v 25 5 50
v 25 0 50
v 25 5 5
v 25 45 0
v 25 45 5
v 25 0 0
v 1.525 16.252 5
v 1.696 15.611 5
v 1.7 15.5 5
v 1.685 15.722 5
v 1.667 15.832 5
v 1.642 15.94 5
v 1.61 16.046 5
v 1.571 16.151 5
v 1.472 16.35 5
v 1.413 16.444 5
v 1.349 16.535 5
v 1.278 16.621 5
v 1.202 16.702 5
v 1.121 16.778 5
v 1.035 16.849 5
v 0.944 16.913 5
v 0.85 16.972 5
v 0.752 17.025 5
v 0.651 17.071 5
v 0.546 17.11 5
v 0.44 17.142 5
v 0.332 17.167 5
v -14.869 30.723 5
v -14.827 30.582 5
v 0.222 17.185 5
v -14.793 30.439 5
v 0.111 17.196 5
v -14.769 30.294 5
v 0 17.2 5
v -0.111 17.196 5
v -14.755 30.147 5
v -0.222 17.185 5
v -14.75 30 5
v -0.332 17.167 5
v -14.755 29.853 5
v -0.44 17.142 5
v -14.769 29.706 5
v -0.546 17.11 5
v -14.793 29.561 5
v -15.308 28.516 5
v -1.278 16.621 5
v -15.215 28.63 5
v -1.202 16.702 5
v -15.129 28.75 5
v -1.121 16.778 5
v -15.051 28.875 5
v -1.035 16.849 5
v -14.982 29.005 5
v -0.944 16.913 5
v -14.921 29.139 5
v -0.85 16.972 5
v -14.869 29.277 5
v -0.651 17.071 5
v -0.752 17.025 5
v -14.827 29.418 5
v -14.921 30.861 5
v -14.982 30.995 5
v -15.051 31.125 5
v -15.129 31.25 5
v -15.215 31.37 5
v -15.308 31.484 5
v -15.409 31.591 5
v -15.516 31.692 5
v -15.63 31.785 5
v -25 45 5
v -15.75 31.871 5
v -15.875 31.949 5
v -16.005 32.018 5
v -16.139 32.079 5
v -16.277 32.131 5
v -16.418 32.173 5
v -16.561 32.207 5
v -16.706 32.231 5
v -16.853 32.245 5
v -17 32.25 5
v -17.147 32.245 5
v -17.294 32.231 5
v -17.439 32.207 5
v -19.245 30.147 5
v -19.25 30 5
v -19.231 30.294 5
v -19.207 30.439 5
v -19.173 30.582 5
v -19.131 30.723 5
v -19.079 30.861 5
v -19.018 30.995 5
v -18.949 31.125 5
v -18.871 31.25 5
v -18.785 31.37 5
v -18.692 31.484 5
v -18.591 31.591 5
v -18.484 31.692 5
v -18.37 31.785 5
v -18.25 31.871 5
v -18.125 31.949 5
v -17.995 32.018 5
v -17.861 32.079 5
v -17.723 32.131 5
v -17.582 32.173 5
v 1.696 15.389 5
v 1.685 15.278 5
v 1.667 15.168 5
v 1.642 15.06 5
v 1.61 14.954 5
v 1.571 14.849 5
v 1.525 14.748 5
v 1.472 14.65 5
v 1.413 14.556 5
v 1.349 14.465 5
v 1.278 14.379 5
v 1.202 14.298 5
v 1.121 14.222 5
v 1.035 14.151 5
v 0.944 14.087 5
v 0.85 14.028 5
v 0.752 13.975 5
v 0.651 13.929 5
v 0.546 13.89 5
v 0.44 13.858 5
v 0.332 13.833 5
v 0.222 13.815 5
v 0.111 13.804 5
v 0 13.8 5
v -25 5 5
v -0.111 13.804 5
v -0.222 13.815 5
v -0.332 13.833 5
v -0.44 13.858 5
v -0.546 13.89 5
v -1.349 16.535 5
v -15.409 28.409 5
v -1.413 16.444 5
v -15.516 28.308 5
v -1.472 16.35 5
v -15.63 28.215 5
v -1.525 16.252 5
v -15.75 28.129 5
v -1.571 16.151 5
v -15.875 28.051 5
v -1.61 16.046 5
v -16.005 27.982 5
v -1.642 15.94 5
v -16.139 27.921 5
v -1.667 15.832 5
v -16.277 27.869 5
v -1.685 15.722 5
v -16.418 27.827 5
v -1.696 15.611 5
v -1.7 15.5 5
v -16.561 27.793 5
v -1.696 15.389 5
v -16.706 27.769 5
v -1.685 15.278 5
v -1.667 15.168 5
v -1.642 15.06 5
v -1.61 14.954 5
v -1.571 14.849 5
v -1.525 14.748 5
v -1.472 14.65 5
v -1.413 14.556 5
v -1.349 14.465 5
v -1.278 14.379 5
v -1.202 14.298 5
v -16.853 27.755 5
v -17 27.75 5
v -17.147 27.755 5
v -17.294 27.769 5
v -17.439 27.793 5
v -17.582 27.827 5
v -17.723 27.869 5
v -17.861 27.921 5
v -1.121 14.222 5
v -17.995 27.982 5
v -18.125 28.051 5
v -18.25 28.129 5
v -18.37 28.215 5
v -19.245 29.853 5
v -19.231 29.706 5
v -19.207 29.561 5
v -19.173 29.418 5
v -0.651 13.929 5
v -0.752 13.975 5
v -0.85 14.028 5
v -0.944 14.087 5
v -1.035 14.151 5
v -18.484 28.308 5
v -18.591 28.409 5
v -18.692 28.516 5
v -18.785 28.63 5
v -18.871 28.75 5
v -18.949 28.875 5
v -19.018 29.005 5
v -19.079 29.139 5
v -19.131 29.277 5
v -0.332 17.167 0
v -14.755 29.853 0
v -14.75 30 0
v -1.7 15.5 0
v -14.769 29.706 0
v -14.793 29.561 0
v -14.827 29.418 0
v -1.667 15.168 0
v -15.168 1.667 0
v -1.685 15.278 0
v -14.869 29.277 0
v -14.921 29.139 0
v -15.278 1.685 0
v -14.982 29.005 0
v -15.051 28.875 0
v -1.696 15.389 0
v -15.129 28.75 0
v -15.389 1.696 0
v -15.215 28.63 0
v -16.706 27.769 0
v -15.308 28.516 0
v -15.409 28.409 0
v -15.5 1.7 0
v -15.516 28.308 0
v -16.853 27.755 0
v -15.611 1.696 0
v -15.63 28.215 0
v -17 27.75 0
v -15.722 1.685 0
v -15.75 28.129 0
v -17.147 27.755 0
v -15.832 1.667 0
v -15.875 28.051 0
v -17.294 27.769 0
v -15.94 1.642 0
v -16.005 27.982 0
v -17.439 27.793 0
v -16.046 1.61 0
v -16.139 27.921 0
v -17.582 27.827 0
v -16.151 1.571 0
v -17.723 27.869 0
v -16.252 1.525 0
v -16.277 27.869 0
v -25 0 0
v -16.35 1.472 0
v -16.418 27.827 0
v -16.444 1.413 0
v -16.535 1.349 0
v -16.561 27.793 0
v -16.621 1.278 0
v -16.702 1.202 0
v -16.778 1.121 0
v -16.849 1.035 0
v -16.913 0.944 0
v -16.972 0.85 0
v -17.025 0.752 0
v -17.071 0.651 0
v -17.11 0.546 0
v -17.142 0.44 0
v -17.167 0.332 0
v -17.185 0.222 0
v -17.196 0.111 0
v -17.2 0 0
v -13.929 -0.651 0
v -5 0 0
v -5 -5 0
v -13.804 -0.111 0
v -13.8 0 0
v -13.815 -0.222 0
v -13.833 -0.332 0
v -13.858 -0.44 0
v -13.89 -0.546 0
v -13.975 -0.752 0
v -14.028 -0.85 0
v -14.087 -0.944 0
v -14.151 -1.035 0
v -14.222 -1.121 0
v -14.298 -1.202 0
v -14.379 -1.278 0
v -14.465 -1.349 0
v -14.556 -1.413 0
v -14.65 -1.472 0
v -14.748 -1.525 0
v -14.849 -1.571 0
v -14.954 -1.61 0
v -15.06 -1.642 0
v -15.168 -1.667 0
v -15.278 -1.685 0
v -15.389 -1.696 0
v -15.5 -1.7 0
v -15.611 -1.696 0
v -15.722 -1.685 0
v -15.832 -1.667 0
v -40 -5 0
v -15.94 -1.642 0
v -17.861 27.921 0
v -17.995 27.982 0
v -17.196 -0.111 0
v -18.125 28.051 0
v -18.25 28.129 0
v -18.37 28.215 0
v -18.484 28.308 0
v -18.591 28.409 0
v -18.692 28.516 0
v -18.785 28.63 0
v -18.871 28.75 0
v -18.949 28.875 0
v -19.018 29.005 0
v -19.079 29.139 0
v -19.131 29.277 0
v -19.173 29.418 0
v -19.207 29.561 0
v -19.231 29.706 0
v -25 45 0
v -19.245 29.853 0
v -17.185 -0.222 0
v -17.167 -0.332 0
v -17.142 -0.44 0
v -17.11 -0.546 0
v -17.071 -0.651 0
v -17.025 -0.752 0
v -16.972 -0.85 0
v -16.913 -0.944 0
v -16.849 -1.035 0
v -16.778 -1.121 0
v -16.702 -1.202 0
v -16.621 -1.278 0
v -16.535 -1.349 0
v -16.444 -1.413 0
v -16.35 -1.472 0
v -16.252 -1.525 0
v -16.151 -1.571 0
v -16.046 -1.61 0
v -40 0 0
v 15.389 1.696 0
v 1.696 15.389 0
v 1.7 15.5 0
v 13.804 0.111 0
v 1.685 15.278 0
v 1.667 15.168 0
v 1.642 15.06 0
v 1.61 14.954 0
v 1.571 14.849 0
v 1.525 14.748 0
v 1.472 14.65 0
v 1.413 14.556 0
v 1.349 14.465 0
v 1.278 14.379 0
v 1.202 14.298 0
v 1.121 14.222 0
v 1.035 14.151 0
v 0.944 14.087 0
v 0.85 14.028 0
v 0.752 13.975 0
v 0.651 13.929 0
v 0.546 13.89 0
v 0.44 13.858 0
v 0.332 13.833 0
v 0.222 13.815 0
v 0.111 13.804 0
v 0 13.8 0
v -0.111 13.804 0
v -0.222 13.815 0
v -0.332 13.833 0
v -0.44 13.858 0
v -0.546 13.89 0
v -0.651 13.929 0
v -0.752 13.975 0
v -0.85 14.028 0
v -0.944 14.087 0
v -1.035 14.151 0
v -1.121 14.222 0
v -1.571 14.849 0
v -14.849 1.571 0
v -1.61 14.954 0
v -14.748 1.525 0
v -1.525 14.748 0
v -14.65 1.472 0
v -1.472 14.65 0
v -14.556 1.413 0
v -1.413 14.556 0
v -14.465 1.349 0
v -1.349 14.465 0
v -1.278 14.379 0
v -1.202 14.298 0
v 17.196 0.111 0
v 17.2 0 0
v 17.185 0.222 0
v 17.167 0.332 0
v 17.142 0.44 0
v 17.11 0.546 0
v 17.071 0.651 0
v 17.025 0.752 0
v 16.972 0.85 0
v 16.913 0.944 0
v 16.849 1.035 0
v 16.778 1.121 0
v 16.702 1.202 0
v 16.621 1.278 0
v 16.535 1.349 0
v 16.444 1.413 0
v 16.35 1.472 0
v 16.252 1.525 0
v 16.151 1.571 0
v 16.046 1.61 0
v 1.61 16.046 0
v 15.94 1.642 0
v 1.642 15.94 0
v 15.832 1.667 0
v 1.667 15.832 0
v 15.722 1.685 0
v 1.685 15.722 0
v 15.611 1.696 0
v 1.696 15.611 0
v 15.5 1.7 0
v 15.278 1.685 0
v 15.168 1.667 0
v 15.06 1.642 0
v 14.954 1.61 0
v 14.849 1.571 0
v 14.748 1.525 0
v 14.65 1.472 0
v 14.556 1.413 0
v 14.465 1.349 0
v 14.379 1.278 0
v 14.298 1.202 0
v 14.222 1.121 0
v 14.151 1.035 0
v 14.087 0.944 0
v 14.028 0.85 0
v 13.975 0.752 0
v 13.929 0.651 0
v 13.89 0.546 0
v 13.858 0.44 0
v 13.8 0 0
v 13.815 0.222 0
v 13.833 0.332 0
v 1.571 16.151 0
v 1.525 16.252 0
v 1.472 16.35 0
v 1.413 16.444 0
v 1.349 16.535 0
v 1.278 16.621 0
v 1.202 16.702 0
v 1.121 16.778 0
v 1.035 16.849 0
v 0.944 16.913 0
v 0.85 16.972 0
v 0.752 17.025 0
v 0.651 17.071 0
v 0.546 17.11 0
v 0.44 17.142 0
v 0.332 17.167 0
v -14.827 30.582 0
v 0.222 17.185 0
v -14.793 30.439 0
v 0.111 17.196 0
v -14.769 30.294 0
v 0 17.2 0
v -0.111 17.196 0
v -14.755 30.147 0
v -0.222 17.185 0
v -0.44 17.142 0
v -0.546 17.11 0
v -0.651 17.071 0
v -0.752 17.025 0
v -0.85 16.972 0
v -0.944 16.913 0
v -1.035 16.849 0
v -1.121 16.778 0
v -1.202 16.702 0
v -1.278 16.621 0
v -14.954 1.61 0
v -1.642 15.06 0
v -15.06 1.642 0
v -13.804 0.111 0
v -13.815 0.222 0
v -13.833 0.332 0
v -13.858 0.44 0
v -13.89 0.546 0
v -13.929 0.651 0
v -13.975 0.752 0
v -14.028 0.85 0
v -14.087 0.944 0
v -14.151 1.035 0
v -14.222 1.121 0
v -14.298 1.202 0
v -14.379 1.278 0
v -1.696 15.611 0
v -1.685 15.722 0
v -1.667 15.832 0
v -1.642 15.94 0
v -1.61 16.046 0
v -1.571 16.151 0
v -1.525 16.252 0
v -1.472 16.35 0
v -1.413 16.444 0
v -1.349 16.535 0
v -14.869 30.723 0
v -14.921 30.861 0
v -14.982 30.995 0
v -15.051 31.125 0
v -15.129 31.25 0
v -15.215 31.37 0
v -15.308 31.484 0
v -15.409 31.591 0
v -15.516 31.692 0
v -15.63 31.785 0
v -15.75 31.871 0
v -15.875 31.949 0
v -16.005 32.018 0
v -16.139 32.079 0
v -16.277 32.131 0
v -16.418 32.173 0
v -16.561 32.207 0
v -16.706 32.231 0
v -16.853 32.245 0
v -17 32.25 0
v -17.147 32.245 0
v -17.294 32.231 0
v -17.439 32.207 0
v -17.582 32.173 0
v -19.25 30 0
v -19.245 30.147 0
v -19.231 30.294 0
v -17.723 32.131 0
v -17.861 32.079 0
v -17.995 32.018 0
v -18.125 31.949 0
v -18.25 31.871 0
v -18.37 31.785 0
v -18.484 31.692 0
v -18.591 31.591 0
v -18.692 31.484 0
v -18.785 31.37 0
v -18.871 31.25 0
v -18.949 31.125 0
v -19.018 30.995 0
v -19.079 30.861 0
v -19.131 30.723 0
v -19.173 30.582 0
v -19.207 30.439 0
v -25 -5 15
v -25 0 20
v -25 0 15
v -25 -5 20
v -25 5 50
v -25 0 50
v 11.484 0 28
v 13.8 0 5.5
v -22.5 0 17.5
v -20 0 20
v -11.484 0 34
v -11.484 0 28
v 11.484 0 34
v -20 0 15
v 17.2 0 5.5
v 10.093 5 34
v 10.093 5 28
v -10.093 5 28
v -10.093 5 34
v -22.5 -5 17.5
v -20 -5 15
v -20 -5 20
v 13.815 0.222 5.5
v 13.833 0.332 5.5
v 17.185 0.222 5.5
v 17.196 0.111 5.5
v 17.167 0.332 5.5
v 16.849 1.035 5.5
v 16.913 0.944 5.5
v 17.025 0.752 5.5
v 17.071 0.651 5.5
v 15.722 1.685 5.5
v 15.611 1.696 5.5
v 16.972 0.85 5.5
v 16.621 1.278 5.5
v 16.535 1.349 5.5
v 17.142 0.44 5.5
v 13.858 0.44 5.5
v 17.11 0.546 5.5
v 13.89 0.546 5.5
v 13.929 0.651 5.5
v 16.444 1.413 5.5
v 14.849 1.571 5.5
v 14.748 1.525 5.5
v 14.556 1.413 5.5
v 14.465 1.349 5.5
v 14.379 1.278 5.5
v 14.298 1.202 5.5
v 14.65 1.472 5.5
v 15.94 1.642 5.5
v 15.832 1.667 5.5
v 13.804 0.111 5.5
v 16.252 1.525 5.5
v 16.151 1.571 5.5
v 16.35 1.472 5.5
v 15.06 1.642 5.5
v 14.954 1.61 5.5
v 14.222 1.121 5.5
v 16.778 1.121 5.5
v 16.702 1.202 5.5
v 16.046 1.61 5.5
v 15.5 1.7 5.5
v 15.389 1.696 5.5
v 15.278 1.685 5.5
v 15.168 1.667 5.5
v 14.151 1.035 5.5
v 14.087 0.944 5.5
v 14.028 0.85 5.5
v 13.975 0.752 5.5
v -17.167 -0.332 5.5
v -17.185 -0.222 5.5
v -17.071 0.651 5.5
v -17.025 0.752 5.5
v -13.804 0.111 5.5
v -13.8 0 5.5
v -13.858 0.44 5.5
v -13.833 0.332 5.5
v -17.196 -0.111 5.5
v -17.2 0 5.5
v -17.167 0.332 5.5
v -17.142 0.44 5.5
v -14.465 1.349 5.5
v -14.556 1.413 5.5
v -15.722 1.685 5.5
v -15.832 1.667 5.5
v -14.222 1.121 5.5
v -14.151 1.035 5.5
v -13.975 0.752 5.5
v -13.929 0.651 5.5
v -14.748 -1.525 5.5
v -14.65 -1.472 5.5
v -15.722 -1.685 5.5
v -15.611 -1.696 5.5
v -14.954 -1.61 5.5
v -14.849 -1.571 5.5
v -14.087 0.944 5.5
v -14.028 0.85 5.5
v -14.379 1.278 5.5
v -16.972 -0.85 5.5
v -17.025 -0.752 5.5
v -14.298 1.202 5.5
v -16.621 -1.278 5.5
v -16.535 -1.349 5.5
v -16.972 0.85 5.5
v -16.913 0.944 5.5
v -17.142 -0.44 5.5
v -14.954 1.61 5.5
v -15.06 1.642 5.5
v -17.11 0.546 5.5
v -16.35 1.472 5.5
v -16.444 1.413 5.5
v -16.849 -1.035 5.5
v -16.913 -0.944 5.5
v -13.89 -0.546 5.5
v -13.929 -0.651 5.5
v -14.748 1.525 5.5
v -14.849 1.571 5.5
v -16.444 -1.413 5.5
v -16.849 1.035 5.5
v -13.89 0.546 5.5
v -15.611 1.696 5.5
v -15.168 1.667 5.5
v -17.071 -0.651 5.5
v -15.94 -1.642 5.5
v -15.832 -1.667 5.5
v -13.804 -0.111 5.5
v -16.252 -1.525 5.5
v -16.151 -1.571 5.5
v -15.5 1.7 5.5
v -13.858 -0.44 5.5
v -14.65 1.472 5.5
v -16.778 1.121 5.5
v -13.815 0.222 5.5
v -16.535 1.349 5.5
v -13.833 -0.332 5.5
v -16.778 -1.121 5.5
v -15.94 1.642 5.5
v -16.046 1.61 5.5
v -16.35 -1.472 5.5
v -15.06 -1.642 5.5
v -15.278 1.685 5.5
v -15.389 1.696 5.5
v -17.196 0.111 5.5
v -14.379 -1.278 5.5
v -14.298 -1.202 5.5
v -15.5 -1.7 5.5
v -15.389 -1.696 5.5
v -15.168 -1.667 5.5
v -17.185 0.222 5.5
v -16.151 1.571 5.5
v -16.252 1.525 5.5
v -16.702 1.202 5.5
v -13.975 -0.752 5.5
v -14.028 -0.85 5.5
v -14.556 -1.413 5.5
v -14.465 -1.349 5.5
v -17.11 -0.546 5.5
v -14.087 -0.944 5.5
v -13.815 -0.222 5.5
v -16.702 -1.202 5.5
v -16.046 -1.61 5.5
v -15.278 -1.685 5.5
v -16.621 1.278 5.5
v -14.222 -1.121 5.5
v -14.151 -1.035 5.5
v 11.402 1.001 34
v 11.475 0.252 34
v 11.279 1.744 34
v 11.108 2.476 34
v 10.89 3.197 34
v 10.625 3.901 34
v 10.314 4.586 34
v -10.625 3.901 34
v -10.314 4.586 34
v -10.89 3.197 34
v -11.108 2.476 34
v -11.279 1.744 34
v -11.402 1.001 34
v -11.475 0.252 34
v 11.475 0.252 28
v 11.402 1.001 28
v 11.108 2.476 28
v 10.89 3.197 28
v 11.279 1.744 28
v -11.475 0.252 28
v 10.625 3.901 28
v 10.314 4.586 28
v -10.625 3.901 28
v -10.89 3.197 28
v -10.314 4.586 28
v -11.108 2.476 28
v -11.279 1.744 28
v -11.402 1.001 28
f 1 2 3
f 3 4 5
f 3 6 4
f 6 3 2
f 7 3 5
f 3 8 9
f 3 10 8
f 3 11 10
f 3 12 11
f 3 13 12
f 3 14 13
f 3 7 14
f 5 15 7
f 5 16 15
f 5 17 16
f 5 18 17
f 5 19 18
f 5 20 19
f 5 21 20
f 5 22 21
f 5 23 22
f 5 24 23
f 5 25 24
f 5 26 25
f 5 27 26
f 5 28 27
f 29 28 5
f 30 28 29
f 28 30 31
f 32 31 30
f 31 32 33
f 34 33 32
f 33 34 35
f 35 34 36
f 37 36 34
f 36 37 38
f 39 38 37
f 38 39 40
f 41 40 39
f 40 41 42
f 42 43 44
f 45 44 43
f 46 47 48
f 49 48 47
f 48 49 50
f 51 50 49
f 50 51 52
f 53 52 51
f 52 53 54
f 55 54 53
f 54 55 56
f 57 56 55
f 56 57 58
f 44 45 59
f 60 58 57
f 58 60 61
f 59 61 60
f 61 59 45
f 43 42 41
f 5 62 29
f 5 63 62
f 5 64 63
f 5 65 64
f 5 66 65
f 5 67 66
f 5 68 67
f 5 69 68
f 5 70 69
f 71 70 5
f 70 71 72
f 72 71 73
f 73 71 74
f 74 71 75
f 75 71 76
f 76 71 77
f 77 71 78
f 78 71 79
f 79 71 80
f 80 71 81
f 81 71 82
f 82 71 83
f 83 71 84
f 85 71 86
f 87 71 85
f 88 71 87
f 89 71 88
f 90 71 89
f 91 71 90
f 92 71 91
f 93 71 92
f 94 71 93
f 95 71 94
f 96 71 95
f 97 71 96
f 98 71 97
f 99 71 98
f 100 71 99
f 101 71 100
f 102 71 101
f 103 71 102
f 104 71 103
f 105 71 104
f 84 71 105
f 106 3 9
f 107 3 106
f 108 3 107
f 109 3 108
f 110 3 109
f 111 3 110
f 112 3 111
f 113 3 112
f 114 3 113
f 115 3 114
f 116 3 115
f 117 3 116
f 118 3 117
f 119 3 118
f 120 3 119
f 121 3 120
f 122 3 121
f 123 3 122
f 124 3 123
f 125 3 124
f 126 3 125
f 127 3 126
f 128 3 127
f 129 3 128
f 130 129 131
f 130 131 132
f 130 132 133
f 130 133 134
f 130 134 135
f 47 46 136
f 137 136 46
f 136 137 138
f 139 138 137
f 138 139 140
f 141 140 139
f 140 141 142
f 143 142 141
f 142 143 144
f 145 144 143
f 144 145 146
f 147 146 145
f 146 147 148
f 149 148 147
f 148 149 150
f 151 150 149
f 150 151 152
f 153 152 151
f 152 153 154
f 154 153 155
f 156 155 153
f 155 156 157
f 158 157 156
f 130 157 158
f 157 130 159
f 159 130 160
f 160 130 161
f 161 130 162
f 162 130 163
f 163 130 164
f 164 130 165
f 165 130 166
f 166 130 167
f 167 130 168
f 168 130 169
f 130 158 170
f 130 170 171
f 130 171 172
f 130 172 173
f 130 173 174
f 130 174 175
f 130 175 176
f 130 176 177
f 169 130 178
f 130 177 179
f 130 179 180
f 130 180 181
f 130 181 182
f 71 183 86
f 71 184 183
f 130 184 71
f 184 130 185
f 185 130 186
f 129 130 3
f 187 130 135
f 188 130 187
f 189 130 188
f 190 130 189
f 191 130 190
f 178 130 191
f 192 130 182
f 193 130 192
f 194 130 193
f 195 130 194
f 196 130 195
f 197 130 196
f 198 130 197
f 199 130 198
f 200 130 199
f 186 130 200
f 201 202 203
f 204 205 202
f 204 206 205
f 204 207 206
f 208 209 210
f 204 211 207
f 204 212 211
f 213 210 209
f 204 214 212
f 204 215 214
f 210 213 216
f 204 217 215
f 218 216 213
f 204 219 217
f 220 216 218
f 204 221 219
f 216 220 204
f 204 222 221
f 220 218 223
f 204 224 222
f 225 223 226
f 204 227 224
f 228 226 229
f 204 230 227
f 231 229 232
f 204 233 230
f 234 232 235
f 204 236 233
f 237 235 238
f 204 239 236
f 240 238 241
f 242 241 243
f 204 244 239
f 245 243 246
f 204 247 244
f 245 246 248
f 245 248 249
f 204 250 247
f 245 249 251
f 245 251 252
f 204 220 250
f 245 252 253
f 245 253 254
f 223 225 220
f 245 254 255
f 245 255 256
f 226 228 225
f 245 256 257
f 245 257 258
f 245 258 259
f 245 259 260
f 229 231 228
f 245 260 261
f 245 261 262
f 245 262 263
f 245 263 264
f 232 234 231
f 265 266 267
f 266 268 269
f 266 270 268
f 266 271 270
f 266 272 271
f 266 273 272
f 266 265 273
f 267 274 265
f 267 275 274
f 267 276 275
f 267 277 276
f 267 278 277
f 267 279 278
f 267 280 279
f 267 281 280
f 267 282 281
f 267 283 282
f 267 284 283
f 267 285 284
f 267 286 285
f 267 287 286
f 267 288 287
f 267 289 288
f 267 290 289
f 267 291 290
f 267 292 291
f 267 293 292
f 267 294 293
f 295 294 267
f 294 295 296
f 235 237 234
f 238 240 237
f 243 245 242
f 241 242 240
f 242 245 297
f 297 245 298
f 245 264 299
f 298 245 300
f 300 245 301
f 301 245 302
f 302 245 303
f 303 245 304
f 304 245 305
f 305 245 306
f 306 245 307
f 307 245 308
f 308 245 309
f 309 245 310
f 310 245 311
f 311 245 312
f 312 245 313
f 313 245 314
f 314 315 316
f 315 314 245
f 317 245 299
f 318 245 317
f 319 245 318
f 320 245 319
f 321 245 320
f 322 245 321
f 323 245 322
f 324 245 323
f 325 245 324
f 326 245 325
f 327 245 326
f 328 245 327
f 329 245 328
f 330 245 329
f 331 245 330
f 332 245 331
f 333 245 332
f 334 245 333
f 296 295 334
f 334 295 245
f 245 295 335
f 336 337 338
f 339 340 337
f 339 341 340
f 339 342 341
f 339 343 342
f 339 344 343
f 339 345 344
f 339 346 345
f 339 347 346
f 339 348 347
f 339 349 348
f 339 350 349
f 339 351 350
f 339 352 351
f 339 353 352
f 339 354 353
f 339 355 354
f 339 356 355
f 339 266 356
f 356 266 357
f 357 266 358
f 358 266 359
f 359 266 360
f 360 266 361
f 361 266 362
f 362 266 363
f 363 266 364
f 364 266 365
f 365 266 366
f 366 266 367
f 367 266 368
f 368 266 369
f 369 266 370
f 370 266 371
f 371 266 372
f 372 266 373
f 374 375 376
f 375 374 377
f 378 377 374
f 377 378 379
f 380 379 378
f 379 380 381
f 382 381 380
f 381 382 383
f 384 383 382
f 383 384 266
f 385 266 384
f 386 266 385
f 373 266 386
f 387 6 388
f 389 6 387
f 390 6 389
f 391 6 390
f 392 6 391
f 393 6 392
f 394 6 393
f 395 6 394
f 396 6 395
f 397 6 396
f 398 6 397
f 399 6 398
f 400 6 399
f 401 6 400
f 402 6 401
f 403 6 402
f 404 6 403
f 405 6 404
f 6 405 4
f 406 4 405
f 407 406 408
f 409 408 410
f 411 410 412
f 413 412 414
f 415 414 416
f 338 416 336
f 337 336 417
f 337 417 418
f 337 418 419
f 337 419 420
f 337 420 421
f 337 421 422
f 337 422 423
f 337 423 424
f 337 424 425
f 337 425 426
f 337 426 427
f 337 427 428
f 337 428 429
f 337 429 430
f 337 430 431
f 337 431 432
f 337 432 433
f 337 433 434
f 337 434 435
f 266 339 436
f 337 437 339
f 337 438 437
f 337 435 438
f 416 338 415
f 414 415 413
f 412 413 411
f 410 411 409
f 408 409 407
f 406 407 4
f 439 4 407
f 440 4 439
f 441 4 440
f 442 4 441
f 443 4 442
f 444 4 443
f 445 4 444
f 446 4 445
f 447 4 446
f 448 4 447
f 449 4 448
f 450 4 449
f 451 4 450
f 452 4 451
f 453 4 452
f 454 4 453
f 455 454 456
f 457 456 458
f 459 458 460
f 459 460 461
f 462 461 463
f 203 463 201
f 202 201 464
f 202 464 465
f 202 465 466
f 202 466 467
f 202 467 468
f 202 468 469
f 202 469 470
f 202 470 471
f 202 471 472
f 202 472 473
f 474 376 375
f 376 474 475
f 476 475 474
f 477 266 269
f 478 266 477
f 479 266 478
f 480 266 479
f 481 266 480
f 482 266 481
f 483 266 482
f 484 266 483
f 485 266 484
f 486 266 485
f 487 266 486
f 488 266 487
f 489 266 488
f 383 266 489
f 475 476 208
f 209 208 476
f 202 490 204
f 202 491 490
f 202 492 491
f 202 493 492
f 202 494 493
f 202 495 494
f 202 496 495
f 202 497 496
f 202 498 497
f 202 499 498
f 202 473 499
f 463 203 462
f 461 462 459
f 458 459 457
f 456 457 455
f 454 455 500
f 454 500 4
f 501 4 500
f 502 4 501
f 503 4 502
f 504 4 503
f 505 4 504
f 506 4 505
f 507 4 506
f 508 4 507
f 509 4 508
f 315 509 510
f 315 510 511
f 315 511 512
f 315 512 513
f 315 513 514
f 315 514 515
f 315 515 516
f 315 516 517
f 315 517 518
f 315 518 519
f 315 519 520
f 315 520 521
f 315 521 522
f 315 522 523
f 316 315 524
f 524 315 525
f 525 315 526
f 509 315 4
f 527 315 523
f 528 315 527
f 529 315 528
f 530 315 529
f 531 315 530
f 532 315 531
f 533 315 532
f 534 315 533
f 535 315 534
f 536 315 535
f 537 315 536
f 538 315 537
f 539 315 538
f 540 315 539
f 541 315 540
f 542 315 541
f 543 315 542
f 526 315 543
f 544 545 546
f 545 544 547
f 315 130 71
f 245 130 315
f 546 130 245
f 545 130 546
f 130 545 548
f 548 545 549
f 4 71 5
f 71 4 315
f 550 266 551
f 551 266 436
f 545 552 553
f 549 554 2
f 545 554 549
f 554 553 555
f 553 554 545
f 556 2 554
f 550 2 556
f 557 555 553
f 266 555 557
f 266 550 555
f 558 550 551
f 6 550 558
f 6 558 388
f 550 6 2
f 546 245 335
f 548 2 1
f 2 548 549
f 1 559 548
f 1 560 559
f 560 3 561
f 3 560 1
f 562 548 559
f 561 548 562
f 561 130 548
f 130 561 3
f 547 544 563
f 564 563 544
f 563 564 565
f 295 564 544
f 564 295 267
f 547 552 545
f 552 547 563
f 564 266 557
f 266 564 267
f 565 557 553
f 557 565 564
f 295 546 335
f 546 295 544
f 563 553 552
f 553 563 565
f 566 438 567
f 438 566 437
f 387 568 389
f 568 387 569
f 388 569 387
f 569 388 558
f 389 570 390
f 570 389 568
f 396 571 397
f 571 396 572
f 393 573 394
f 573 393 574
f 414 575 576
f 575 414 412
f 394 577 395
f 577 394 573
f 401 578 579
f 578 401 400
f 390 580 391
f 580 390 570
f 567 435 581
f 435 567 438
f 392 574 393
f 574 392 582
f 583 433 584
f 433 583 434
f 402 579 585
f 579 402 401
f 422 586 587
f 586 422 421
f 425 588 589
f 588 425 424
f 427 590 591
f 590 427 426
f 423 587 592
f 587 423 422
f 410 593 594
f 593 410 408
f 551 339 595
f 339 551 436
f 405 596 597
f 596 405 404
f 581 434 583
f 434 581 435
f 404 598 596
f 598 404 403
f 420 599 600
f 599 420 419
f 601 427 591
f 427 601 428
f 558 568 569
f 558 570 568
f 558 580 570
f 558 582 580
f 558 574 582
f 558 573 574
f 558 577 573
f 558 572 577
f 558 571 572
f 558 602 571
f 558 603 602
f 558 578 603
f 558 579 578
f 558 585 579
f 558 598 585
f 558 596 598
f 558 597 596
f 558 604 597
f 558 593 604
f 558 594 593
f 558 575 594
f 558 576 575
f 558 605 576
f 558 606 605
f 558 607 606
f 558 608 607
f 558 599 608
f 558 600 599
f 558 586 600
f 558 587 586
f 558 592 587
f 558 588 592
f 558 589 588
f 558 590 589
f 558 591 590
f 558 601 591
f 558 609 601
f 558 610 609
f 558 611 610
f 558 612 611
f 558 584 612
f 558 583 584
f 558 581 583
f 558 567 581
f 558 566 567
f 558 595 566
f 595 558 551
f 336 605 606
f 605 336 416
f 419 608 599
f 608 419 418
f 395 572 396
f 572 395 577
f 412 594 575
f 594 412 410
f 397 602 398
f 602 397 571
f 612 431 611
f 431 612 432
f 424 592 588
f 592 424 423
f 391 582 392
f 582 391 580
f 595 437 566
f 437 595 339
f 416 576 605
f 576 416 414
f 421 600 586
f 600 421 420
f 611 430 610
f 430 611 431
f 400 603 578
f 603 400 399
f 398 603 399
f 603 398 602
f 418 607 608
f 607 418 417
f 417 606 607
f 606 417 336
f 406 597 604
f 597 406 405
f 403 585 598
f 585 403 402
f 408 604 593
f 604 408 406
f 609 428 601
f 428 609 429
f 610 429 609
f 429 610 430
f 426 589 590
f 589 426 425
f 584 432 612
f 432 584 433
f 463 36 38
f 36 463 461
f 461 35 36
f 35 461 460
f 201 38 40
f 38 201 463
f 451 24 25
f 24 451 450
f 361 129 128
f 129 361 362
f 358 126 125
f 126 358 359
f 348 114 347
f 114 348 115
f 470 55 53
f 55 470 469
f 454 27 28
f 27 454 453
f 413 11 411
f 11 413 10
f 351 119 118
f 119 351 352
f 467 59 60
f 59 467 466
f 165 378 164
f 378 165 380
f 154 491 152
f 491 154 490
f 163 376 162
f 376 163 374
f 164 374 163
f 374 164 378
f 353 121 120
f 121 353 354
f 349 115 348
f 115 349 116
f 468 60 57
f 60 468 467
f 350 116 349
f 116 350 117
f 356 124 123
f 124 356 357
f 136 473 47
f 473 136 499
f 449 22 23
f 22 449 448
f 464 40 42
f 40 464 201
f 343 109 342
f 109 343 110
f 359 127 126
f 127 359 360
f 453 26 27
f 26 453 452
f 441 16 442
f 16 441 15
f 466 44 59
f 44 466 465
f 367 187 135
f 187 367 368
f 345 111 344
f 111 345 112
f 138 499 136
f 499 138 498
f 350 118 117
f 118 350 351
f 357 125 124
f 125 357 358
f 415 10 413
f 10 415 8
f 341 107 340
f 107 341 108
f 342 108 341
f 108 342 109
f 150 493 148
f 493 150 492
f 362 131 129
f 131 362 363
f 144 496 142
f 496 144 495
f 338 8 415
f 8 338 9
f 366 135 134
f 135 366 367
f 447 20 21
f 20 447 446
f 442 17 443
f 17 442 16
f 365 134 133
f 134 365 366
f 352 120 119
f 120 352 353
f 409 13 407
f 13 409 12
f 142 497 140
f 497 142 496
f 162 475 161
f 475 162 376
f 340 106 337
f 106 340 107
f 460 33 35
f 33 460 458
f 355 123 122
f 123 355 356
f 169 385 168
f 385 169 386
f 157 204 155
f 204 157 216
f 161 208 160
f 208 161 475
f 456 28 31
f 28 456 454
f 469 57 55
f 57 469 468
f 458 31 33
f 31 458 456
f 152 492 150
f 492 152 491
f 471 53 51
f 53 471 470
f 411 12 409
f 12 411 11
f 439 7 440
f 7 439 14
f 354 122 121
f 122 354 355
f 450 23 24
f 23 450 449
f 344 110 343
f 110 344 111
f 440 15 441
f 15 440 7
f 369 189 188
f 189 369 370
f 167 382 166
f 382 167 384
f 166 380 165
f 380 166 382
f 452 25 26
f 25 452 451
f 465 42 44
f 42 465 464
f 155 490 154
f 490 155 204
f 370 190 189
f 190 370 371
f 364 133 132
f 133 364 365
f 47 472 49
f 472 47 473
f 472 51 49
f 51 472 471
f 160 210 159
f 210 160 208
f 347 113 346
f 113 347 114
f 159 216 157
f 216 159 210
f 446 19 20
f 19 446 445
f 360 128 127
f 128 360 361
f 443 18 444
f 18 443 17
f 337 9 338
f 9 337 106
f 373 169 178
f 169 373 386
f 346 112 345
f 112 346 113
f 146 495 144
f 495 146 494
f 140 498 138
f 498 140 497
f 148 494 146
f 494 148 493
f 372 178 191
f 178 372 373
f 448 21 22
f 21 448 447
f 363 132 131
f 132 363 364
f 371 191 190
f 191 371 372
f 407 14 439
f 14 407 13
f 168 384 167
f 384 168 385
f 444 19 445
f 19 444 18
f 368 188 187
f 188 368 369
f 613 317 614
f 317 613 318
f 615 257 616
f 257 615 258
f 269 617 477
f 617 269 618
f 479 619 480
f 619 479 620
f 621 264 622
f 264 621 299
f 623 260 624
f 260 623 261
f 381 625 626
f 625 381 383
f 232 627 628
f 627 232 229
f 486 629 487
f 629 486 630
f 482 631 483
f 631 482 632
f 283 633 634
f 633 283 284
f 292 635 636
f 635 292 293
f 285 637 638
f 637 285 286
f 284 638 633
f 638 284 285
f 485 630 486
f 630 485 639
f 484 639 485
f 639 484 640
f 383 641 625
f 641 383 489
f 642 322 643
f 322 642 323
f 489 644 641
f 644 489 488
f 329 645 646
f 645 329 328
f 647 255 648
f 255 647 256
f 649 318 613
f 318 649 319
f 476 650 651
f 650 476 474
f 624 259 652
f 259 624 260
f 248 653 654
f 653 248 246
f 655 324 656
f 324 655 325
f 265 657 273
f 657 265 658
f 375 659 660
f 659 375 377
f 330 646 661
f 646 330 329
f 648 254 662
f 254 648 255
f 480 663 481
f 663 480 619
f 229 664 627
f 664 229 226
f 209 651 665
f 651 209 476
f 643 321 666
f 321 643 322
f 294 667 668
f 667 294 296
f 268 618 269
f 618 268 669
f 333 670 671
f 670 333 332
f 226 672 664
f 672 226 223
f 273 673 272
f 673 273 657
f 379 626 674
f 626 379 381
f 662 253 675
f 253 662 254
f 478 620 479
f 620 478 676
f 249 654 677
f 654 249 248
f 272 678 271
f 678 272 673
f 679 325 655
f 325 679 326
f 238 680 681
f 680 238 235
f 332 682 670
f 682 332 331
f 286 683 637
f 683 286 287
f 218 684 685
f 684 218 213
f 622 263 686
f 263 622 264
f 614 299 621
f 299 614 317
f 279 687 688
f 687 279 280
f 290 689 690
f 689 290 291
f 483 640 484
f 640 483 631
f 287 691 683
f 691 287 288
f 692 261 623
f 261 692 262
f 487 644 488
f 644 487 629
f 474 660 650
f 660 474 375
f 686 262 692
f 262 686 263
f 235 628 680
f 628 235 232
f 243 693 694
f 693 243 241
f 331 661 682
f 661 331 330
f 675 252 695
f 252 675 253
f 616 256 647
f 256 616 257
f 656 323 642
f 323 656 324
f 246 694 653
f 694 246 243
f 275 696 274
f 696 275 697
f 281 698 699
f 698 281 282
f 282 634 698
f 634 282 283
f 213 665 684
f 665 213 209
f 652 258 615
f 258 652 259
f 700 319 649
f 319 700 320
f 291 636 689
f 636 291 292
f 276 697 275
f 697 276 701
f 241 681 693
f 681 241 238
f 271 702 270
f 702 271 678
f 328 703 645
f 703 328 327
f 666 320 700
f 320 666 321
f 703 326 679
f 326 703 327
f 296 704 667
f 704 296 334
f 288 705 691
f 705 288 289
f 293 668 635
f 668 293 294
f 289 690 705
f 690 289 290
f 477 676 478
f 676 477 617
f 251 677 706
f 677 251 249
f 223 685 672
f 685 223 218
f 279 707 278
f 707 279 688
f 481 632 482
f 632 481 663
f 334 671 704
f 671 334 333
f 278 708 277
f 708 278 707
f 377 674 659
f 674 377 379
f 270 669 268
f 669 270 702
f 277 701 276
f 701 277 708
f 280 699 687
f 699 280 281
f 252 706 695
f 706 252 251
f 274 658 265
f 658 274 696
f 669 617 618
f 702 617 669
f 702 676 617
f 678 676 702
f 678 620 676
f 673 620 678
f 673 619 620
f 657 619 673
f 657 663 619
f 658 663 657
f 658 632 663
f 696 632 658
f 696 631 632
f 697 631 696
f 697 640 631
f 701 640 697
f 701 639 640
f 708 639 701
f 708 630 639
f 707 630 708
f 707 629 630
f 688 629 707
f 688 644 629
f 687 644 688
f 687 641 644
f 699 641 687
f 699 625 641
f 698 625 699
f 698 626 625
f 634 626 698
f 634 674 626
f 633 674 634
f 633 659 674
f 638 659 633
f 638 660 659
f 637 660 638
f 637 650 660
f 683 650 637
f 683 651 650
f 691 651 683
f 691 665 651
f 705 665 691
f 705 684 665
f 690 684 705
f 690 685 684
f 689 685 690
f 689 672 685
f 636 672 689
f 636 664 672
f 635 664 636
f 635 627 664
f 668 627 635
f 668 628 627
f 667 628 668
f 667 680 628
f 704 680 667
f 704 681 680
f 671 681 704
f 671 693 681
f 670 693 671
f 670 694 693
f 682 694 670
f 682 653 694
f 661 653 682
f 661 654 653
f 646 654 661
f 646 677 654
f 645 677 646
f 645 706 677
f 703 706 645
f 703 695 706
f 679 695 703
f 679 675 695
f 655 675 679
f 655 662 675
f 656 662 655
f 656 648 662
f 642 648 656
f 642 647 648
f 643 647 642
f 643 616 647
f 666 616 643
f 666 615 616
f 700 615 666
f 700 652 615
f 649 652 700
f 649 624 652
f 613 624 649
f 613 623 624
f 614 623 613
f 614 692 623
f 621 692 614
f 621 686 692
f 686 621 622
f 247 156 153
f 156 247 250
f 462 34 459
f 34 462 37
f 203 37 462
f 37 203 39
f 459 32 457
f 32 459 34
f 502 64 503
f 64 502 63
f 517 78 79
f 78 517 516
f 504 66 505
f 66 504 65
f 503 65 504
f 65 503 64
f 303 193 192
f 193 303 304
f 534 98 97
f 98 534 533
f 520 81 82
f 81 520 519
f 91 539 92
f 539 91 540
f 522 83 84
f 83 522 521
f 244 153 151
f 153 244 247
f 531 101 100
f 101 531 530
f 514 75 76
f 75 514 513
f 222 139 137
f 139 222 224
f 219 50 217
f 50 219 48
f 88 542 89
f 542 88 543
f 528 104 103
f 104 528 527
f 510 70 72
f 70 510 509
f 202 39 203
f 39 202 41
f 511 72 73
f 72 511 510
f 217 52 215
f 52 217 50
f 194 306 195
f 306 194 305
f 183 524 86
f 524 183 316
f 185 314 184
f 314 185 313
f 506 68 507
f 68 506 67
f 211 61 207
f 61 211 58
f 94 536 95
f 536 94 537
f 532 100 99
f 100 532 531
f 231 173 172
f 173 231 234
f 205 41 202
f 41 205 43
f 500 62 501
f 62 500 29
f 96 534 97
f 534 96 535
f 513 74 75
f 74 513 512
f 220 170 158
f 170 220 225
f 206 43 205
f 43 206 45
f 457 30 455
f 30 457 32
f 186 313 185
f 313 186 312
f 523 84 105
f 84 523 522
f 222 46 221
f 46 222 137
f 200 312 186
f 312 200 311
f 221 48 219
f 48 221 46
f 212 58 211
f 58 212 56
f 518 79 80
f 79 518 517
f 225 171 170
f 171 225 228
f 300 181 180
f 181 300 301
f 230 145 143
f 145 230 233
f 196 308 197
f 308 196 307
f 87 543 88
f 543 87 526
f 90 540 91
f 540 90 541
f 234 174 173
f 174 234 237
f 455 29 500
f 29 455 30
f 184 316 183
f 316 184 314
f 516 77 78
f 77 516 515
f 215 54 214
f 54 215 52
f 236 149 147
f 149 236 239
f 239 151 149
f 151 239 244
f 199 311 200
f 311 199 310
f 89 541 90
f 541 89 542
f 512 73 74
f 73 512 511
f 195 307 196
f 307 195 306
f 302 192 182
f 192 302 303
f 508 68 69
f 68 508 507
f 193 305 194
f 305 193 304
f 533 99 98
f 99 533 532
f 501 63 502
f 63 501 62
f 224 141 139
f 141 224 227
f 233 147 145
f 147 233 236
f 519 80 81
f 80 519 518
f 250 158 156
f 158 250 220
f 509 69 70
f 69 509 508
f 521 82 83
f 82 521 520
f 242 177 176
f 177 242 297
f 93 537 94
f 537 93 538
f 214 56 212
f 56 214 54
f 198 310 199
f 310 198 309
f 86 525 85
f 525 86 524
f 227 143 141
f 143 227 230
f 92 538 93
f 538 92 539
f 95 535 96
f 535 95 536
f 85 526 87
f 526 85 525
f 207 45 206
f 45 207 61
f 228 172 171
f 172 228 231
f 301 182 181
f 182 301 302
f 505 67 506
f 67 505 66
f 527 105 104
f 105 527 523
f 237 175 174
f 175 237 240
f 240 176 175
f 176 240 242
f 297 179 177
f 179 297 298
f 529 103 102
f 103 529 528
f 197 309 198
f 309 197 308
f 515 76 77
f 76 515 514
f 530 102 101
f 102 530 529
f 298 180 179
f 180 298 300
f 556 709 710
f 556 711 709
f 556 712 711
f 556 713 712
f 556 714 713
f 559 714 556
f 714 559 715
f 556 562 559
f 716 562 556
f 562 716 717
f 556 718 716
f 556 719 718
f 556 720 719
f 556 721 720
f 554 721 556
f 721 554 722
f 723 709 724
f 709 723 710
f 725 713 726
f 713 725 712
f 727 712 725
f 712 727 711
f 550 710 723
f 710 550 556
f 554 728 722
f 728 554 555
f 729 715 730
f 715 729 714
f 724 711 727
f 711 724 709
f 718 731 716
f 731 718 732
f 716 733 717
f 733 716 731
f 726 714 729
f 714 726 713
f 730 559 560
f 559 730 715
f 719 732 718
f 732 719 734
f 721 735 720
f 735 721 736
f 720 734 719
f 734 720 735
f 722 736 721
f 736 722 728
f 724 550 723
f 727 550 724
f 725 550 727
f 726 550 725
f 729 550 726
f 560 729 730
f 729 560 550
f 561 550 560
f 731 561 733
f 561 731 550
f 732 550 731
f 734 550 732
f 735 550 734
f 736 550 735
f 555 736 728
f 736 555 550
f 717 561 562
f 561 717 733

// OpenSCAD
// L-shaped mounting bracket for NEMA 17 stepper motor
// Print orientation: base plate on bed (z = 0), vertical plate builds upward (+Z)

// ---------------- Parameters ----------------
base_x0      = -25;    // base plate: x start
base_x1      = 25;     // base plate: x end
base_y0      = 0;      // base plate: y start
base_y1      = 45;     // base plate: y end
base_z0      = 0;      // base plate: z start
base_z1      = 5;      // base plate: z end

hole_x       = -17;    // M4 through-hole x position
hole_y       = 30;     // M4 through-hole y position
hole_d       = 4.5;    // M4 hole diameter

plate_x0     = -25;    // motor plate: x start
plate_x1     = 25;     // motor plate: x end
plate_y0     = 0;      // motor plate: y start
plate_y1     = 5;      // motor plate: y end (thickness)
plate_z0     = 0;      // motor plate: z start
plate_z1     = 50;     // motor plate: z end

boss_d       = 23;     // motor centring boss hole diameter
boss_x       = 0;      // boss hole centre x
boss_z       = 28;     // boss hole centre z

screw_d      = 3.4;    // M3 screw hole diameter
screw_p      = 31;     // square pattern pitch (centre to centre)

gusset_t     = 5;      // gusset thickness (X)
gusset_leg   = 20;     // right triangle leg length (Y and Z)
gusset_x0    = -25;    // left gusset x start
gusset_x1    = -20;    // left gusset x end

eps          = 0.5;    // cutter overshoot past faces

$fn = 96;

// ---------------- Model ----------------
difference() {
    union() {
        // Base plate
        translate([base_x0, base_y0, base_z0])
            cube([base_x1 - base_x0, base_y1 - base_y0, base_z1 - base_z0]);

        // Vertical motor plate
        translate([plate_x0, plate_y0, plate_z0])
            cube([plate_x1 - plate_x0, plate_y1 - plate_y0, plate_z1 - plate_z0]);

        // Left triangular gusset (flush with left edge)
        translate([gusset_x0, 0, 0])
            rotate([90, 0, 0])
                linear_extrude(height = gusset_t)
                    polygon(points = [
                        [0, 0],
                        [gusset_leg, 0],
                        [0, gusset_leg]
                    ]);

        // Right triangular gusset (flush with right edge)
        translate([gusset_x1, 0, 0])
            rotate([90, 0, 0])
                linear_extrude(height = gusset_t)
                    polygon(points = [
                        [0, 0],
                        [-gusset_leg, 0],
                        [0, gusset_leg]
                    ]);
    }

    // M4 through-holes in base plate
    translate([hole_x, hole_y, -eps])
        cylinder(d = hole_d, h = base_z1 - base_z0 + 2 * eps);

    // Motor boss hole through vertical plate (along Y)
    translate([boss_x, plate_y0 - eps, boss_z])
        cylinder(d = boss_d, h = plate_y1 - plate_y0 + 2 * eps);

    // M3 screw holes on 31 mm square pattern, centred on boss hole
    for (a = [0, 90, 180, 270])
        rotate([0, 0, a])
            translate([screw_p / 2, 0, 0])
                cylinder(d = screw_d, h = plate_y1 - plate_y0 + eps);
}
